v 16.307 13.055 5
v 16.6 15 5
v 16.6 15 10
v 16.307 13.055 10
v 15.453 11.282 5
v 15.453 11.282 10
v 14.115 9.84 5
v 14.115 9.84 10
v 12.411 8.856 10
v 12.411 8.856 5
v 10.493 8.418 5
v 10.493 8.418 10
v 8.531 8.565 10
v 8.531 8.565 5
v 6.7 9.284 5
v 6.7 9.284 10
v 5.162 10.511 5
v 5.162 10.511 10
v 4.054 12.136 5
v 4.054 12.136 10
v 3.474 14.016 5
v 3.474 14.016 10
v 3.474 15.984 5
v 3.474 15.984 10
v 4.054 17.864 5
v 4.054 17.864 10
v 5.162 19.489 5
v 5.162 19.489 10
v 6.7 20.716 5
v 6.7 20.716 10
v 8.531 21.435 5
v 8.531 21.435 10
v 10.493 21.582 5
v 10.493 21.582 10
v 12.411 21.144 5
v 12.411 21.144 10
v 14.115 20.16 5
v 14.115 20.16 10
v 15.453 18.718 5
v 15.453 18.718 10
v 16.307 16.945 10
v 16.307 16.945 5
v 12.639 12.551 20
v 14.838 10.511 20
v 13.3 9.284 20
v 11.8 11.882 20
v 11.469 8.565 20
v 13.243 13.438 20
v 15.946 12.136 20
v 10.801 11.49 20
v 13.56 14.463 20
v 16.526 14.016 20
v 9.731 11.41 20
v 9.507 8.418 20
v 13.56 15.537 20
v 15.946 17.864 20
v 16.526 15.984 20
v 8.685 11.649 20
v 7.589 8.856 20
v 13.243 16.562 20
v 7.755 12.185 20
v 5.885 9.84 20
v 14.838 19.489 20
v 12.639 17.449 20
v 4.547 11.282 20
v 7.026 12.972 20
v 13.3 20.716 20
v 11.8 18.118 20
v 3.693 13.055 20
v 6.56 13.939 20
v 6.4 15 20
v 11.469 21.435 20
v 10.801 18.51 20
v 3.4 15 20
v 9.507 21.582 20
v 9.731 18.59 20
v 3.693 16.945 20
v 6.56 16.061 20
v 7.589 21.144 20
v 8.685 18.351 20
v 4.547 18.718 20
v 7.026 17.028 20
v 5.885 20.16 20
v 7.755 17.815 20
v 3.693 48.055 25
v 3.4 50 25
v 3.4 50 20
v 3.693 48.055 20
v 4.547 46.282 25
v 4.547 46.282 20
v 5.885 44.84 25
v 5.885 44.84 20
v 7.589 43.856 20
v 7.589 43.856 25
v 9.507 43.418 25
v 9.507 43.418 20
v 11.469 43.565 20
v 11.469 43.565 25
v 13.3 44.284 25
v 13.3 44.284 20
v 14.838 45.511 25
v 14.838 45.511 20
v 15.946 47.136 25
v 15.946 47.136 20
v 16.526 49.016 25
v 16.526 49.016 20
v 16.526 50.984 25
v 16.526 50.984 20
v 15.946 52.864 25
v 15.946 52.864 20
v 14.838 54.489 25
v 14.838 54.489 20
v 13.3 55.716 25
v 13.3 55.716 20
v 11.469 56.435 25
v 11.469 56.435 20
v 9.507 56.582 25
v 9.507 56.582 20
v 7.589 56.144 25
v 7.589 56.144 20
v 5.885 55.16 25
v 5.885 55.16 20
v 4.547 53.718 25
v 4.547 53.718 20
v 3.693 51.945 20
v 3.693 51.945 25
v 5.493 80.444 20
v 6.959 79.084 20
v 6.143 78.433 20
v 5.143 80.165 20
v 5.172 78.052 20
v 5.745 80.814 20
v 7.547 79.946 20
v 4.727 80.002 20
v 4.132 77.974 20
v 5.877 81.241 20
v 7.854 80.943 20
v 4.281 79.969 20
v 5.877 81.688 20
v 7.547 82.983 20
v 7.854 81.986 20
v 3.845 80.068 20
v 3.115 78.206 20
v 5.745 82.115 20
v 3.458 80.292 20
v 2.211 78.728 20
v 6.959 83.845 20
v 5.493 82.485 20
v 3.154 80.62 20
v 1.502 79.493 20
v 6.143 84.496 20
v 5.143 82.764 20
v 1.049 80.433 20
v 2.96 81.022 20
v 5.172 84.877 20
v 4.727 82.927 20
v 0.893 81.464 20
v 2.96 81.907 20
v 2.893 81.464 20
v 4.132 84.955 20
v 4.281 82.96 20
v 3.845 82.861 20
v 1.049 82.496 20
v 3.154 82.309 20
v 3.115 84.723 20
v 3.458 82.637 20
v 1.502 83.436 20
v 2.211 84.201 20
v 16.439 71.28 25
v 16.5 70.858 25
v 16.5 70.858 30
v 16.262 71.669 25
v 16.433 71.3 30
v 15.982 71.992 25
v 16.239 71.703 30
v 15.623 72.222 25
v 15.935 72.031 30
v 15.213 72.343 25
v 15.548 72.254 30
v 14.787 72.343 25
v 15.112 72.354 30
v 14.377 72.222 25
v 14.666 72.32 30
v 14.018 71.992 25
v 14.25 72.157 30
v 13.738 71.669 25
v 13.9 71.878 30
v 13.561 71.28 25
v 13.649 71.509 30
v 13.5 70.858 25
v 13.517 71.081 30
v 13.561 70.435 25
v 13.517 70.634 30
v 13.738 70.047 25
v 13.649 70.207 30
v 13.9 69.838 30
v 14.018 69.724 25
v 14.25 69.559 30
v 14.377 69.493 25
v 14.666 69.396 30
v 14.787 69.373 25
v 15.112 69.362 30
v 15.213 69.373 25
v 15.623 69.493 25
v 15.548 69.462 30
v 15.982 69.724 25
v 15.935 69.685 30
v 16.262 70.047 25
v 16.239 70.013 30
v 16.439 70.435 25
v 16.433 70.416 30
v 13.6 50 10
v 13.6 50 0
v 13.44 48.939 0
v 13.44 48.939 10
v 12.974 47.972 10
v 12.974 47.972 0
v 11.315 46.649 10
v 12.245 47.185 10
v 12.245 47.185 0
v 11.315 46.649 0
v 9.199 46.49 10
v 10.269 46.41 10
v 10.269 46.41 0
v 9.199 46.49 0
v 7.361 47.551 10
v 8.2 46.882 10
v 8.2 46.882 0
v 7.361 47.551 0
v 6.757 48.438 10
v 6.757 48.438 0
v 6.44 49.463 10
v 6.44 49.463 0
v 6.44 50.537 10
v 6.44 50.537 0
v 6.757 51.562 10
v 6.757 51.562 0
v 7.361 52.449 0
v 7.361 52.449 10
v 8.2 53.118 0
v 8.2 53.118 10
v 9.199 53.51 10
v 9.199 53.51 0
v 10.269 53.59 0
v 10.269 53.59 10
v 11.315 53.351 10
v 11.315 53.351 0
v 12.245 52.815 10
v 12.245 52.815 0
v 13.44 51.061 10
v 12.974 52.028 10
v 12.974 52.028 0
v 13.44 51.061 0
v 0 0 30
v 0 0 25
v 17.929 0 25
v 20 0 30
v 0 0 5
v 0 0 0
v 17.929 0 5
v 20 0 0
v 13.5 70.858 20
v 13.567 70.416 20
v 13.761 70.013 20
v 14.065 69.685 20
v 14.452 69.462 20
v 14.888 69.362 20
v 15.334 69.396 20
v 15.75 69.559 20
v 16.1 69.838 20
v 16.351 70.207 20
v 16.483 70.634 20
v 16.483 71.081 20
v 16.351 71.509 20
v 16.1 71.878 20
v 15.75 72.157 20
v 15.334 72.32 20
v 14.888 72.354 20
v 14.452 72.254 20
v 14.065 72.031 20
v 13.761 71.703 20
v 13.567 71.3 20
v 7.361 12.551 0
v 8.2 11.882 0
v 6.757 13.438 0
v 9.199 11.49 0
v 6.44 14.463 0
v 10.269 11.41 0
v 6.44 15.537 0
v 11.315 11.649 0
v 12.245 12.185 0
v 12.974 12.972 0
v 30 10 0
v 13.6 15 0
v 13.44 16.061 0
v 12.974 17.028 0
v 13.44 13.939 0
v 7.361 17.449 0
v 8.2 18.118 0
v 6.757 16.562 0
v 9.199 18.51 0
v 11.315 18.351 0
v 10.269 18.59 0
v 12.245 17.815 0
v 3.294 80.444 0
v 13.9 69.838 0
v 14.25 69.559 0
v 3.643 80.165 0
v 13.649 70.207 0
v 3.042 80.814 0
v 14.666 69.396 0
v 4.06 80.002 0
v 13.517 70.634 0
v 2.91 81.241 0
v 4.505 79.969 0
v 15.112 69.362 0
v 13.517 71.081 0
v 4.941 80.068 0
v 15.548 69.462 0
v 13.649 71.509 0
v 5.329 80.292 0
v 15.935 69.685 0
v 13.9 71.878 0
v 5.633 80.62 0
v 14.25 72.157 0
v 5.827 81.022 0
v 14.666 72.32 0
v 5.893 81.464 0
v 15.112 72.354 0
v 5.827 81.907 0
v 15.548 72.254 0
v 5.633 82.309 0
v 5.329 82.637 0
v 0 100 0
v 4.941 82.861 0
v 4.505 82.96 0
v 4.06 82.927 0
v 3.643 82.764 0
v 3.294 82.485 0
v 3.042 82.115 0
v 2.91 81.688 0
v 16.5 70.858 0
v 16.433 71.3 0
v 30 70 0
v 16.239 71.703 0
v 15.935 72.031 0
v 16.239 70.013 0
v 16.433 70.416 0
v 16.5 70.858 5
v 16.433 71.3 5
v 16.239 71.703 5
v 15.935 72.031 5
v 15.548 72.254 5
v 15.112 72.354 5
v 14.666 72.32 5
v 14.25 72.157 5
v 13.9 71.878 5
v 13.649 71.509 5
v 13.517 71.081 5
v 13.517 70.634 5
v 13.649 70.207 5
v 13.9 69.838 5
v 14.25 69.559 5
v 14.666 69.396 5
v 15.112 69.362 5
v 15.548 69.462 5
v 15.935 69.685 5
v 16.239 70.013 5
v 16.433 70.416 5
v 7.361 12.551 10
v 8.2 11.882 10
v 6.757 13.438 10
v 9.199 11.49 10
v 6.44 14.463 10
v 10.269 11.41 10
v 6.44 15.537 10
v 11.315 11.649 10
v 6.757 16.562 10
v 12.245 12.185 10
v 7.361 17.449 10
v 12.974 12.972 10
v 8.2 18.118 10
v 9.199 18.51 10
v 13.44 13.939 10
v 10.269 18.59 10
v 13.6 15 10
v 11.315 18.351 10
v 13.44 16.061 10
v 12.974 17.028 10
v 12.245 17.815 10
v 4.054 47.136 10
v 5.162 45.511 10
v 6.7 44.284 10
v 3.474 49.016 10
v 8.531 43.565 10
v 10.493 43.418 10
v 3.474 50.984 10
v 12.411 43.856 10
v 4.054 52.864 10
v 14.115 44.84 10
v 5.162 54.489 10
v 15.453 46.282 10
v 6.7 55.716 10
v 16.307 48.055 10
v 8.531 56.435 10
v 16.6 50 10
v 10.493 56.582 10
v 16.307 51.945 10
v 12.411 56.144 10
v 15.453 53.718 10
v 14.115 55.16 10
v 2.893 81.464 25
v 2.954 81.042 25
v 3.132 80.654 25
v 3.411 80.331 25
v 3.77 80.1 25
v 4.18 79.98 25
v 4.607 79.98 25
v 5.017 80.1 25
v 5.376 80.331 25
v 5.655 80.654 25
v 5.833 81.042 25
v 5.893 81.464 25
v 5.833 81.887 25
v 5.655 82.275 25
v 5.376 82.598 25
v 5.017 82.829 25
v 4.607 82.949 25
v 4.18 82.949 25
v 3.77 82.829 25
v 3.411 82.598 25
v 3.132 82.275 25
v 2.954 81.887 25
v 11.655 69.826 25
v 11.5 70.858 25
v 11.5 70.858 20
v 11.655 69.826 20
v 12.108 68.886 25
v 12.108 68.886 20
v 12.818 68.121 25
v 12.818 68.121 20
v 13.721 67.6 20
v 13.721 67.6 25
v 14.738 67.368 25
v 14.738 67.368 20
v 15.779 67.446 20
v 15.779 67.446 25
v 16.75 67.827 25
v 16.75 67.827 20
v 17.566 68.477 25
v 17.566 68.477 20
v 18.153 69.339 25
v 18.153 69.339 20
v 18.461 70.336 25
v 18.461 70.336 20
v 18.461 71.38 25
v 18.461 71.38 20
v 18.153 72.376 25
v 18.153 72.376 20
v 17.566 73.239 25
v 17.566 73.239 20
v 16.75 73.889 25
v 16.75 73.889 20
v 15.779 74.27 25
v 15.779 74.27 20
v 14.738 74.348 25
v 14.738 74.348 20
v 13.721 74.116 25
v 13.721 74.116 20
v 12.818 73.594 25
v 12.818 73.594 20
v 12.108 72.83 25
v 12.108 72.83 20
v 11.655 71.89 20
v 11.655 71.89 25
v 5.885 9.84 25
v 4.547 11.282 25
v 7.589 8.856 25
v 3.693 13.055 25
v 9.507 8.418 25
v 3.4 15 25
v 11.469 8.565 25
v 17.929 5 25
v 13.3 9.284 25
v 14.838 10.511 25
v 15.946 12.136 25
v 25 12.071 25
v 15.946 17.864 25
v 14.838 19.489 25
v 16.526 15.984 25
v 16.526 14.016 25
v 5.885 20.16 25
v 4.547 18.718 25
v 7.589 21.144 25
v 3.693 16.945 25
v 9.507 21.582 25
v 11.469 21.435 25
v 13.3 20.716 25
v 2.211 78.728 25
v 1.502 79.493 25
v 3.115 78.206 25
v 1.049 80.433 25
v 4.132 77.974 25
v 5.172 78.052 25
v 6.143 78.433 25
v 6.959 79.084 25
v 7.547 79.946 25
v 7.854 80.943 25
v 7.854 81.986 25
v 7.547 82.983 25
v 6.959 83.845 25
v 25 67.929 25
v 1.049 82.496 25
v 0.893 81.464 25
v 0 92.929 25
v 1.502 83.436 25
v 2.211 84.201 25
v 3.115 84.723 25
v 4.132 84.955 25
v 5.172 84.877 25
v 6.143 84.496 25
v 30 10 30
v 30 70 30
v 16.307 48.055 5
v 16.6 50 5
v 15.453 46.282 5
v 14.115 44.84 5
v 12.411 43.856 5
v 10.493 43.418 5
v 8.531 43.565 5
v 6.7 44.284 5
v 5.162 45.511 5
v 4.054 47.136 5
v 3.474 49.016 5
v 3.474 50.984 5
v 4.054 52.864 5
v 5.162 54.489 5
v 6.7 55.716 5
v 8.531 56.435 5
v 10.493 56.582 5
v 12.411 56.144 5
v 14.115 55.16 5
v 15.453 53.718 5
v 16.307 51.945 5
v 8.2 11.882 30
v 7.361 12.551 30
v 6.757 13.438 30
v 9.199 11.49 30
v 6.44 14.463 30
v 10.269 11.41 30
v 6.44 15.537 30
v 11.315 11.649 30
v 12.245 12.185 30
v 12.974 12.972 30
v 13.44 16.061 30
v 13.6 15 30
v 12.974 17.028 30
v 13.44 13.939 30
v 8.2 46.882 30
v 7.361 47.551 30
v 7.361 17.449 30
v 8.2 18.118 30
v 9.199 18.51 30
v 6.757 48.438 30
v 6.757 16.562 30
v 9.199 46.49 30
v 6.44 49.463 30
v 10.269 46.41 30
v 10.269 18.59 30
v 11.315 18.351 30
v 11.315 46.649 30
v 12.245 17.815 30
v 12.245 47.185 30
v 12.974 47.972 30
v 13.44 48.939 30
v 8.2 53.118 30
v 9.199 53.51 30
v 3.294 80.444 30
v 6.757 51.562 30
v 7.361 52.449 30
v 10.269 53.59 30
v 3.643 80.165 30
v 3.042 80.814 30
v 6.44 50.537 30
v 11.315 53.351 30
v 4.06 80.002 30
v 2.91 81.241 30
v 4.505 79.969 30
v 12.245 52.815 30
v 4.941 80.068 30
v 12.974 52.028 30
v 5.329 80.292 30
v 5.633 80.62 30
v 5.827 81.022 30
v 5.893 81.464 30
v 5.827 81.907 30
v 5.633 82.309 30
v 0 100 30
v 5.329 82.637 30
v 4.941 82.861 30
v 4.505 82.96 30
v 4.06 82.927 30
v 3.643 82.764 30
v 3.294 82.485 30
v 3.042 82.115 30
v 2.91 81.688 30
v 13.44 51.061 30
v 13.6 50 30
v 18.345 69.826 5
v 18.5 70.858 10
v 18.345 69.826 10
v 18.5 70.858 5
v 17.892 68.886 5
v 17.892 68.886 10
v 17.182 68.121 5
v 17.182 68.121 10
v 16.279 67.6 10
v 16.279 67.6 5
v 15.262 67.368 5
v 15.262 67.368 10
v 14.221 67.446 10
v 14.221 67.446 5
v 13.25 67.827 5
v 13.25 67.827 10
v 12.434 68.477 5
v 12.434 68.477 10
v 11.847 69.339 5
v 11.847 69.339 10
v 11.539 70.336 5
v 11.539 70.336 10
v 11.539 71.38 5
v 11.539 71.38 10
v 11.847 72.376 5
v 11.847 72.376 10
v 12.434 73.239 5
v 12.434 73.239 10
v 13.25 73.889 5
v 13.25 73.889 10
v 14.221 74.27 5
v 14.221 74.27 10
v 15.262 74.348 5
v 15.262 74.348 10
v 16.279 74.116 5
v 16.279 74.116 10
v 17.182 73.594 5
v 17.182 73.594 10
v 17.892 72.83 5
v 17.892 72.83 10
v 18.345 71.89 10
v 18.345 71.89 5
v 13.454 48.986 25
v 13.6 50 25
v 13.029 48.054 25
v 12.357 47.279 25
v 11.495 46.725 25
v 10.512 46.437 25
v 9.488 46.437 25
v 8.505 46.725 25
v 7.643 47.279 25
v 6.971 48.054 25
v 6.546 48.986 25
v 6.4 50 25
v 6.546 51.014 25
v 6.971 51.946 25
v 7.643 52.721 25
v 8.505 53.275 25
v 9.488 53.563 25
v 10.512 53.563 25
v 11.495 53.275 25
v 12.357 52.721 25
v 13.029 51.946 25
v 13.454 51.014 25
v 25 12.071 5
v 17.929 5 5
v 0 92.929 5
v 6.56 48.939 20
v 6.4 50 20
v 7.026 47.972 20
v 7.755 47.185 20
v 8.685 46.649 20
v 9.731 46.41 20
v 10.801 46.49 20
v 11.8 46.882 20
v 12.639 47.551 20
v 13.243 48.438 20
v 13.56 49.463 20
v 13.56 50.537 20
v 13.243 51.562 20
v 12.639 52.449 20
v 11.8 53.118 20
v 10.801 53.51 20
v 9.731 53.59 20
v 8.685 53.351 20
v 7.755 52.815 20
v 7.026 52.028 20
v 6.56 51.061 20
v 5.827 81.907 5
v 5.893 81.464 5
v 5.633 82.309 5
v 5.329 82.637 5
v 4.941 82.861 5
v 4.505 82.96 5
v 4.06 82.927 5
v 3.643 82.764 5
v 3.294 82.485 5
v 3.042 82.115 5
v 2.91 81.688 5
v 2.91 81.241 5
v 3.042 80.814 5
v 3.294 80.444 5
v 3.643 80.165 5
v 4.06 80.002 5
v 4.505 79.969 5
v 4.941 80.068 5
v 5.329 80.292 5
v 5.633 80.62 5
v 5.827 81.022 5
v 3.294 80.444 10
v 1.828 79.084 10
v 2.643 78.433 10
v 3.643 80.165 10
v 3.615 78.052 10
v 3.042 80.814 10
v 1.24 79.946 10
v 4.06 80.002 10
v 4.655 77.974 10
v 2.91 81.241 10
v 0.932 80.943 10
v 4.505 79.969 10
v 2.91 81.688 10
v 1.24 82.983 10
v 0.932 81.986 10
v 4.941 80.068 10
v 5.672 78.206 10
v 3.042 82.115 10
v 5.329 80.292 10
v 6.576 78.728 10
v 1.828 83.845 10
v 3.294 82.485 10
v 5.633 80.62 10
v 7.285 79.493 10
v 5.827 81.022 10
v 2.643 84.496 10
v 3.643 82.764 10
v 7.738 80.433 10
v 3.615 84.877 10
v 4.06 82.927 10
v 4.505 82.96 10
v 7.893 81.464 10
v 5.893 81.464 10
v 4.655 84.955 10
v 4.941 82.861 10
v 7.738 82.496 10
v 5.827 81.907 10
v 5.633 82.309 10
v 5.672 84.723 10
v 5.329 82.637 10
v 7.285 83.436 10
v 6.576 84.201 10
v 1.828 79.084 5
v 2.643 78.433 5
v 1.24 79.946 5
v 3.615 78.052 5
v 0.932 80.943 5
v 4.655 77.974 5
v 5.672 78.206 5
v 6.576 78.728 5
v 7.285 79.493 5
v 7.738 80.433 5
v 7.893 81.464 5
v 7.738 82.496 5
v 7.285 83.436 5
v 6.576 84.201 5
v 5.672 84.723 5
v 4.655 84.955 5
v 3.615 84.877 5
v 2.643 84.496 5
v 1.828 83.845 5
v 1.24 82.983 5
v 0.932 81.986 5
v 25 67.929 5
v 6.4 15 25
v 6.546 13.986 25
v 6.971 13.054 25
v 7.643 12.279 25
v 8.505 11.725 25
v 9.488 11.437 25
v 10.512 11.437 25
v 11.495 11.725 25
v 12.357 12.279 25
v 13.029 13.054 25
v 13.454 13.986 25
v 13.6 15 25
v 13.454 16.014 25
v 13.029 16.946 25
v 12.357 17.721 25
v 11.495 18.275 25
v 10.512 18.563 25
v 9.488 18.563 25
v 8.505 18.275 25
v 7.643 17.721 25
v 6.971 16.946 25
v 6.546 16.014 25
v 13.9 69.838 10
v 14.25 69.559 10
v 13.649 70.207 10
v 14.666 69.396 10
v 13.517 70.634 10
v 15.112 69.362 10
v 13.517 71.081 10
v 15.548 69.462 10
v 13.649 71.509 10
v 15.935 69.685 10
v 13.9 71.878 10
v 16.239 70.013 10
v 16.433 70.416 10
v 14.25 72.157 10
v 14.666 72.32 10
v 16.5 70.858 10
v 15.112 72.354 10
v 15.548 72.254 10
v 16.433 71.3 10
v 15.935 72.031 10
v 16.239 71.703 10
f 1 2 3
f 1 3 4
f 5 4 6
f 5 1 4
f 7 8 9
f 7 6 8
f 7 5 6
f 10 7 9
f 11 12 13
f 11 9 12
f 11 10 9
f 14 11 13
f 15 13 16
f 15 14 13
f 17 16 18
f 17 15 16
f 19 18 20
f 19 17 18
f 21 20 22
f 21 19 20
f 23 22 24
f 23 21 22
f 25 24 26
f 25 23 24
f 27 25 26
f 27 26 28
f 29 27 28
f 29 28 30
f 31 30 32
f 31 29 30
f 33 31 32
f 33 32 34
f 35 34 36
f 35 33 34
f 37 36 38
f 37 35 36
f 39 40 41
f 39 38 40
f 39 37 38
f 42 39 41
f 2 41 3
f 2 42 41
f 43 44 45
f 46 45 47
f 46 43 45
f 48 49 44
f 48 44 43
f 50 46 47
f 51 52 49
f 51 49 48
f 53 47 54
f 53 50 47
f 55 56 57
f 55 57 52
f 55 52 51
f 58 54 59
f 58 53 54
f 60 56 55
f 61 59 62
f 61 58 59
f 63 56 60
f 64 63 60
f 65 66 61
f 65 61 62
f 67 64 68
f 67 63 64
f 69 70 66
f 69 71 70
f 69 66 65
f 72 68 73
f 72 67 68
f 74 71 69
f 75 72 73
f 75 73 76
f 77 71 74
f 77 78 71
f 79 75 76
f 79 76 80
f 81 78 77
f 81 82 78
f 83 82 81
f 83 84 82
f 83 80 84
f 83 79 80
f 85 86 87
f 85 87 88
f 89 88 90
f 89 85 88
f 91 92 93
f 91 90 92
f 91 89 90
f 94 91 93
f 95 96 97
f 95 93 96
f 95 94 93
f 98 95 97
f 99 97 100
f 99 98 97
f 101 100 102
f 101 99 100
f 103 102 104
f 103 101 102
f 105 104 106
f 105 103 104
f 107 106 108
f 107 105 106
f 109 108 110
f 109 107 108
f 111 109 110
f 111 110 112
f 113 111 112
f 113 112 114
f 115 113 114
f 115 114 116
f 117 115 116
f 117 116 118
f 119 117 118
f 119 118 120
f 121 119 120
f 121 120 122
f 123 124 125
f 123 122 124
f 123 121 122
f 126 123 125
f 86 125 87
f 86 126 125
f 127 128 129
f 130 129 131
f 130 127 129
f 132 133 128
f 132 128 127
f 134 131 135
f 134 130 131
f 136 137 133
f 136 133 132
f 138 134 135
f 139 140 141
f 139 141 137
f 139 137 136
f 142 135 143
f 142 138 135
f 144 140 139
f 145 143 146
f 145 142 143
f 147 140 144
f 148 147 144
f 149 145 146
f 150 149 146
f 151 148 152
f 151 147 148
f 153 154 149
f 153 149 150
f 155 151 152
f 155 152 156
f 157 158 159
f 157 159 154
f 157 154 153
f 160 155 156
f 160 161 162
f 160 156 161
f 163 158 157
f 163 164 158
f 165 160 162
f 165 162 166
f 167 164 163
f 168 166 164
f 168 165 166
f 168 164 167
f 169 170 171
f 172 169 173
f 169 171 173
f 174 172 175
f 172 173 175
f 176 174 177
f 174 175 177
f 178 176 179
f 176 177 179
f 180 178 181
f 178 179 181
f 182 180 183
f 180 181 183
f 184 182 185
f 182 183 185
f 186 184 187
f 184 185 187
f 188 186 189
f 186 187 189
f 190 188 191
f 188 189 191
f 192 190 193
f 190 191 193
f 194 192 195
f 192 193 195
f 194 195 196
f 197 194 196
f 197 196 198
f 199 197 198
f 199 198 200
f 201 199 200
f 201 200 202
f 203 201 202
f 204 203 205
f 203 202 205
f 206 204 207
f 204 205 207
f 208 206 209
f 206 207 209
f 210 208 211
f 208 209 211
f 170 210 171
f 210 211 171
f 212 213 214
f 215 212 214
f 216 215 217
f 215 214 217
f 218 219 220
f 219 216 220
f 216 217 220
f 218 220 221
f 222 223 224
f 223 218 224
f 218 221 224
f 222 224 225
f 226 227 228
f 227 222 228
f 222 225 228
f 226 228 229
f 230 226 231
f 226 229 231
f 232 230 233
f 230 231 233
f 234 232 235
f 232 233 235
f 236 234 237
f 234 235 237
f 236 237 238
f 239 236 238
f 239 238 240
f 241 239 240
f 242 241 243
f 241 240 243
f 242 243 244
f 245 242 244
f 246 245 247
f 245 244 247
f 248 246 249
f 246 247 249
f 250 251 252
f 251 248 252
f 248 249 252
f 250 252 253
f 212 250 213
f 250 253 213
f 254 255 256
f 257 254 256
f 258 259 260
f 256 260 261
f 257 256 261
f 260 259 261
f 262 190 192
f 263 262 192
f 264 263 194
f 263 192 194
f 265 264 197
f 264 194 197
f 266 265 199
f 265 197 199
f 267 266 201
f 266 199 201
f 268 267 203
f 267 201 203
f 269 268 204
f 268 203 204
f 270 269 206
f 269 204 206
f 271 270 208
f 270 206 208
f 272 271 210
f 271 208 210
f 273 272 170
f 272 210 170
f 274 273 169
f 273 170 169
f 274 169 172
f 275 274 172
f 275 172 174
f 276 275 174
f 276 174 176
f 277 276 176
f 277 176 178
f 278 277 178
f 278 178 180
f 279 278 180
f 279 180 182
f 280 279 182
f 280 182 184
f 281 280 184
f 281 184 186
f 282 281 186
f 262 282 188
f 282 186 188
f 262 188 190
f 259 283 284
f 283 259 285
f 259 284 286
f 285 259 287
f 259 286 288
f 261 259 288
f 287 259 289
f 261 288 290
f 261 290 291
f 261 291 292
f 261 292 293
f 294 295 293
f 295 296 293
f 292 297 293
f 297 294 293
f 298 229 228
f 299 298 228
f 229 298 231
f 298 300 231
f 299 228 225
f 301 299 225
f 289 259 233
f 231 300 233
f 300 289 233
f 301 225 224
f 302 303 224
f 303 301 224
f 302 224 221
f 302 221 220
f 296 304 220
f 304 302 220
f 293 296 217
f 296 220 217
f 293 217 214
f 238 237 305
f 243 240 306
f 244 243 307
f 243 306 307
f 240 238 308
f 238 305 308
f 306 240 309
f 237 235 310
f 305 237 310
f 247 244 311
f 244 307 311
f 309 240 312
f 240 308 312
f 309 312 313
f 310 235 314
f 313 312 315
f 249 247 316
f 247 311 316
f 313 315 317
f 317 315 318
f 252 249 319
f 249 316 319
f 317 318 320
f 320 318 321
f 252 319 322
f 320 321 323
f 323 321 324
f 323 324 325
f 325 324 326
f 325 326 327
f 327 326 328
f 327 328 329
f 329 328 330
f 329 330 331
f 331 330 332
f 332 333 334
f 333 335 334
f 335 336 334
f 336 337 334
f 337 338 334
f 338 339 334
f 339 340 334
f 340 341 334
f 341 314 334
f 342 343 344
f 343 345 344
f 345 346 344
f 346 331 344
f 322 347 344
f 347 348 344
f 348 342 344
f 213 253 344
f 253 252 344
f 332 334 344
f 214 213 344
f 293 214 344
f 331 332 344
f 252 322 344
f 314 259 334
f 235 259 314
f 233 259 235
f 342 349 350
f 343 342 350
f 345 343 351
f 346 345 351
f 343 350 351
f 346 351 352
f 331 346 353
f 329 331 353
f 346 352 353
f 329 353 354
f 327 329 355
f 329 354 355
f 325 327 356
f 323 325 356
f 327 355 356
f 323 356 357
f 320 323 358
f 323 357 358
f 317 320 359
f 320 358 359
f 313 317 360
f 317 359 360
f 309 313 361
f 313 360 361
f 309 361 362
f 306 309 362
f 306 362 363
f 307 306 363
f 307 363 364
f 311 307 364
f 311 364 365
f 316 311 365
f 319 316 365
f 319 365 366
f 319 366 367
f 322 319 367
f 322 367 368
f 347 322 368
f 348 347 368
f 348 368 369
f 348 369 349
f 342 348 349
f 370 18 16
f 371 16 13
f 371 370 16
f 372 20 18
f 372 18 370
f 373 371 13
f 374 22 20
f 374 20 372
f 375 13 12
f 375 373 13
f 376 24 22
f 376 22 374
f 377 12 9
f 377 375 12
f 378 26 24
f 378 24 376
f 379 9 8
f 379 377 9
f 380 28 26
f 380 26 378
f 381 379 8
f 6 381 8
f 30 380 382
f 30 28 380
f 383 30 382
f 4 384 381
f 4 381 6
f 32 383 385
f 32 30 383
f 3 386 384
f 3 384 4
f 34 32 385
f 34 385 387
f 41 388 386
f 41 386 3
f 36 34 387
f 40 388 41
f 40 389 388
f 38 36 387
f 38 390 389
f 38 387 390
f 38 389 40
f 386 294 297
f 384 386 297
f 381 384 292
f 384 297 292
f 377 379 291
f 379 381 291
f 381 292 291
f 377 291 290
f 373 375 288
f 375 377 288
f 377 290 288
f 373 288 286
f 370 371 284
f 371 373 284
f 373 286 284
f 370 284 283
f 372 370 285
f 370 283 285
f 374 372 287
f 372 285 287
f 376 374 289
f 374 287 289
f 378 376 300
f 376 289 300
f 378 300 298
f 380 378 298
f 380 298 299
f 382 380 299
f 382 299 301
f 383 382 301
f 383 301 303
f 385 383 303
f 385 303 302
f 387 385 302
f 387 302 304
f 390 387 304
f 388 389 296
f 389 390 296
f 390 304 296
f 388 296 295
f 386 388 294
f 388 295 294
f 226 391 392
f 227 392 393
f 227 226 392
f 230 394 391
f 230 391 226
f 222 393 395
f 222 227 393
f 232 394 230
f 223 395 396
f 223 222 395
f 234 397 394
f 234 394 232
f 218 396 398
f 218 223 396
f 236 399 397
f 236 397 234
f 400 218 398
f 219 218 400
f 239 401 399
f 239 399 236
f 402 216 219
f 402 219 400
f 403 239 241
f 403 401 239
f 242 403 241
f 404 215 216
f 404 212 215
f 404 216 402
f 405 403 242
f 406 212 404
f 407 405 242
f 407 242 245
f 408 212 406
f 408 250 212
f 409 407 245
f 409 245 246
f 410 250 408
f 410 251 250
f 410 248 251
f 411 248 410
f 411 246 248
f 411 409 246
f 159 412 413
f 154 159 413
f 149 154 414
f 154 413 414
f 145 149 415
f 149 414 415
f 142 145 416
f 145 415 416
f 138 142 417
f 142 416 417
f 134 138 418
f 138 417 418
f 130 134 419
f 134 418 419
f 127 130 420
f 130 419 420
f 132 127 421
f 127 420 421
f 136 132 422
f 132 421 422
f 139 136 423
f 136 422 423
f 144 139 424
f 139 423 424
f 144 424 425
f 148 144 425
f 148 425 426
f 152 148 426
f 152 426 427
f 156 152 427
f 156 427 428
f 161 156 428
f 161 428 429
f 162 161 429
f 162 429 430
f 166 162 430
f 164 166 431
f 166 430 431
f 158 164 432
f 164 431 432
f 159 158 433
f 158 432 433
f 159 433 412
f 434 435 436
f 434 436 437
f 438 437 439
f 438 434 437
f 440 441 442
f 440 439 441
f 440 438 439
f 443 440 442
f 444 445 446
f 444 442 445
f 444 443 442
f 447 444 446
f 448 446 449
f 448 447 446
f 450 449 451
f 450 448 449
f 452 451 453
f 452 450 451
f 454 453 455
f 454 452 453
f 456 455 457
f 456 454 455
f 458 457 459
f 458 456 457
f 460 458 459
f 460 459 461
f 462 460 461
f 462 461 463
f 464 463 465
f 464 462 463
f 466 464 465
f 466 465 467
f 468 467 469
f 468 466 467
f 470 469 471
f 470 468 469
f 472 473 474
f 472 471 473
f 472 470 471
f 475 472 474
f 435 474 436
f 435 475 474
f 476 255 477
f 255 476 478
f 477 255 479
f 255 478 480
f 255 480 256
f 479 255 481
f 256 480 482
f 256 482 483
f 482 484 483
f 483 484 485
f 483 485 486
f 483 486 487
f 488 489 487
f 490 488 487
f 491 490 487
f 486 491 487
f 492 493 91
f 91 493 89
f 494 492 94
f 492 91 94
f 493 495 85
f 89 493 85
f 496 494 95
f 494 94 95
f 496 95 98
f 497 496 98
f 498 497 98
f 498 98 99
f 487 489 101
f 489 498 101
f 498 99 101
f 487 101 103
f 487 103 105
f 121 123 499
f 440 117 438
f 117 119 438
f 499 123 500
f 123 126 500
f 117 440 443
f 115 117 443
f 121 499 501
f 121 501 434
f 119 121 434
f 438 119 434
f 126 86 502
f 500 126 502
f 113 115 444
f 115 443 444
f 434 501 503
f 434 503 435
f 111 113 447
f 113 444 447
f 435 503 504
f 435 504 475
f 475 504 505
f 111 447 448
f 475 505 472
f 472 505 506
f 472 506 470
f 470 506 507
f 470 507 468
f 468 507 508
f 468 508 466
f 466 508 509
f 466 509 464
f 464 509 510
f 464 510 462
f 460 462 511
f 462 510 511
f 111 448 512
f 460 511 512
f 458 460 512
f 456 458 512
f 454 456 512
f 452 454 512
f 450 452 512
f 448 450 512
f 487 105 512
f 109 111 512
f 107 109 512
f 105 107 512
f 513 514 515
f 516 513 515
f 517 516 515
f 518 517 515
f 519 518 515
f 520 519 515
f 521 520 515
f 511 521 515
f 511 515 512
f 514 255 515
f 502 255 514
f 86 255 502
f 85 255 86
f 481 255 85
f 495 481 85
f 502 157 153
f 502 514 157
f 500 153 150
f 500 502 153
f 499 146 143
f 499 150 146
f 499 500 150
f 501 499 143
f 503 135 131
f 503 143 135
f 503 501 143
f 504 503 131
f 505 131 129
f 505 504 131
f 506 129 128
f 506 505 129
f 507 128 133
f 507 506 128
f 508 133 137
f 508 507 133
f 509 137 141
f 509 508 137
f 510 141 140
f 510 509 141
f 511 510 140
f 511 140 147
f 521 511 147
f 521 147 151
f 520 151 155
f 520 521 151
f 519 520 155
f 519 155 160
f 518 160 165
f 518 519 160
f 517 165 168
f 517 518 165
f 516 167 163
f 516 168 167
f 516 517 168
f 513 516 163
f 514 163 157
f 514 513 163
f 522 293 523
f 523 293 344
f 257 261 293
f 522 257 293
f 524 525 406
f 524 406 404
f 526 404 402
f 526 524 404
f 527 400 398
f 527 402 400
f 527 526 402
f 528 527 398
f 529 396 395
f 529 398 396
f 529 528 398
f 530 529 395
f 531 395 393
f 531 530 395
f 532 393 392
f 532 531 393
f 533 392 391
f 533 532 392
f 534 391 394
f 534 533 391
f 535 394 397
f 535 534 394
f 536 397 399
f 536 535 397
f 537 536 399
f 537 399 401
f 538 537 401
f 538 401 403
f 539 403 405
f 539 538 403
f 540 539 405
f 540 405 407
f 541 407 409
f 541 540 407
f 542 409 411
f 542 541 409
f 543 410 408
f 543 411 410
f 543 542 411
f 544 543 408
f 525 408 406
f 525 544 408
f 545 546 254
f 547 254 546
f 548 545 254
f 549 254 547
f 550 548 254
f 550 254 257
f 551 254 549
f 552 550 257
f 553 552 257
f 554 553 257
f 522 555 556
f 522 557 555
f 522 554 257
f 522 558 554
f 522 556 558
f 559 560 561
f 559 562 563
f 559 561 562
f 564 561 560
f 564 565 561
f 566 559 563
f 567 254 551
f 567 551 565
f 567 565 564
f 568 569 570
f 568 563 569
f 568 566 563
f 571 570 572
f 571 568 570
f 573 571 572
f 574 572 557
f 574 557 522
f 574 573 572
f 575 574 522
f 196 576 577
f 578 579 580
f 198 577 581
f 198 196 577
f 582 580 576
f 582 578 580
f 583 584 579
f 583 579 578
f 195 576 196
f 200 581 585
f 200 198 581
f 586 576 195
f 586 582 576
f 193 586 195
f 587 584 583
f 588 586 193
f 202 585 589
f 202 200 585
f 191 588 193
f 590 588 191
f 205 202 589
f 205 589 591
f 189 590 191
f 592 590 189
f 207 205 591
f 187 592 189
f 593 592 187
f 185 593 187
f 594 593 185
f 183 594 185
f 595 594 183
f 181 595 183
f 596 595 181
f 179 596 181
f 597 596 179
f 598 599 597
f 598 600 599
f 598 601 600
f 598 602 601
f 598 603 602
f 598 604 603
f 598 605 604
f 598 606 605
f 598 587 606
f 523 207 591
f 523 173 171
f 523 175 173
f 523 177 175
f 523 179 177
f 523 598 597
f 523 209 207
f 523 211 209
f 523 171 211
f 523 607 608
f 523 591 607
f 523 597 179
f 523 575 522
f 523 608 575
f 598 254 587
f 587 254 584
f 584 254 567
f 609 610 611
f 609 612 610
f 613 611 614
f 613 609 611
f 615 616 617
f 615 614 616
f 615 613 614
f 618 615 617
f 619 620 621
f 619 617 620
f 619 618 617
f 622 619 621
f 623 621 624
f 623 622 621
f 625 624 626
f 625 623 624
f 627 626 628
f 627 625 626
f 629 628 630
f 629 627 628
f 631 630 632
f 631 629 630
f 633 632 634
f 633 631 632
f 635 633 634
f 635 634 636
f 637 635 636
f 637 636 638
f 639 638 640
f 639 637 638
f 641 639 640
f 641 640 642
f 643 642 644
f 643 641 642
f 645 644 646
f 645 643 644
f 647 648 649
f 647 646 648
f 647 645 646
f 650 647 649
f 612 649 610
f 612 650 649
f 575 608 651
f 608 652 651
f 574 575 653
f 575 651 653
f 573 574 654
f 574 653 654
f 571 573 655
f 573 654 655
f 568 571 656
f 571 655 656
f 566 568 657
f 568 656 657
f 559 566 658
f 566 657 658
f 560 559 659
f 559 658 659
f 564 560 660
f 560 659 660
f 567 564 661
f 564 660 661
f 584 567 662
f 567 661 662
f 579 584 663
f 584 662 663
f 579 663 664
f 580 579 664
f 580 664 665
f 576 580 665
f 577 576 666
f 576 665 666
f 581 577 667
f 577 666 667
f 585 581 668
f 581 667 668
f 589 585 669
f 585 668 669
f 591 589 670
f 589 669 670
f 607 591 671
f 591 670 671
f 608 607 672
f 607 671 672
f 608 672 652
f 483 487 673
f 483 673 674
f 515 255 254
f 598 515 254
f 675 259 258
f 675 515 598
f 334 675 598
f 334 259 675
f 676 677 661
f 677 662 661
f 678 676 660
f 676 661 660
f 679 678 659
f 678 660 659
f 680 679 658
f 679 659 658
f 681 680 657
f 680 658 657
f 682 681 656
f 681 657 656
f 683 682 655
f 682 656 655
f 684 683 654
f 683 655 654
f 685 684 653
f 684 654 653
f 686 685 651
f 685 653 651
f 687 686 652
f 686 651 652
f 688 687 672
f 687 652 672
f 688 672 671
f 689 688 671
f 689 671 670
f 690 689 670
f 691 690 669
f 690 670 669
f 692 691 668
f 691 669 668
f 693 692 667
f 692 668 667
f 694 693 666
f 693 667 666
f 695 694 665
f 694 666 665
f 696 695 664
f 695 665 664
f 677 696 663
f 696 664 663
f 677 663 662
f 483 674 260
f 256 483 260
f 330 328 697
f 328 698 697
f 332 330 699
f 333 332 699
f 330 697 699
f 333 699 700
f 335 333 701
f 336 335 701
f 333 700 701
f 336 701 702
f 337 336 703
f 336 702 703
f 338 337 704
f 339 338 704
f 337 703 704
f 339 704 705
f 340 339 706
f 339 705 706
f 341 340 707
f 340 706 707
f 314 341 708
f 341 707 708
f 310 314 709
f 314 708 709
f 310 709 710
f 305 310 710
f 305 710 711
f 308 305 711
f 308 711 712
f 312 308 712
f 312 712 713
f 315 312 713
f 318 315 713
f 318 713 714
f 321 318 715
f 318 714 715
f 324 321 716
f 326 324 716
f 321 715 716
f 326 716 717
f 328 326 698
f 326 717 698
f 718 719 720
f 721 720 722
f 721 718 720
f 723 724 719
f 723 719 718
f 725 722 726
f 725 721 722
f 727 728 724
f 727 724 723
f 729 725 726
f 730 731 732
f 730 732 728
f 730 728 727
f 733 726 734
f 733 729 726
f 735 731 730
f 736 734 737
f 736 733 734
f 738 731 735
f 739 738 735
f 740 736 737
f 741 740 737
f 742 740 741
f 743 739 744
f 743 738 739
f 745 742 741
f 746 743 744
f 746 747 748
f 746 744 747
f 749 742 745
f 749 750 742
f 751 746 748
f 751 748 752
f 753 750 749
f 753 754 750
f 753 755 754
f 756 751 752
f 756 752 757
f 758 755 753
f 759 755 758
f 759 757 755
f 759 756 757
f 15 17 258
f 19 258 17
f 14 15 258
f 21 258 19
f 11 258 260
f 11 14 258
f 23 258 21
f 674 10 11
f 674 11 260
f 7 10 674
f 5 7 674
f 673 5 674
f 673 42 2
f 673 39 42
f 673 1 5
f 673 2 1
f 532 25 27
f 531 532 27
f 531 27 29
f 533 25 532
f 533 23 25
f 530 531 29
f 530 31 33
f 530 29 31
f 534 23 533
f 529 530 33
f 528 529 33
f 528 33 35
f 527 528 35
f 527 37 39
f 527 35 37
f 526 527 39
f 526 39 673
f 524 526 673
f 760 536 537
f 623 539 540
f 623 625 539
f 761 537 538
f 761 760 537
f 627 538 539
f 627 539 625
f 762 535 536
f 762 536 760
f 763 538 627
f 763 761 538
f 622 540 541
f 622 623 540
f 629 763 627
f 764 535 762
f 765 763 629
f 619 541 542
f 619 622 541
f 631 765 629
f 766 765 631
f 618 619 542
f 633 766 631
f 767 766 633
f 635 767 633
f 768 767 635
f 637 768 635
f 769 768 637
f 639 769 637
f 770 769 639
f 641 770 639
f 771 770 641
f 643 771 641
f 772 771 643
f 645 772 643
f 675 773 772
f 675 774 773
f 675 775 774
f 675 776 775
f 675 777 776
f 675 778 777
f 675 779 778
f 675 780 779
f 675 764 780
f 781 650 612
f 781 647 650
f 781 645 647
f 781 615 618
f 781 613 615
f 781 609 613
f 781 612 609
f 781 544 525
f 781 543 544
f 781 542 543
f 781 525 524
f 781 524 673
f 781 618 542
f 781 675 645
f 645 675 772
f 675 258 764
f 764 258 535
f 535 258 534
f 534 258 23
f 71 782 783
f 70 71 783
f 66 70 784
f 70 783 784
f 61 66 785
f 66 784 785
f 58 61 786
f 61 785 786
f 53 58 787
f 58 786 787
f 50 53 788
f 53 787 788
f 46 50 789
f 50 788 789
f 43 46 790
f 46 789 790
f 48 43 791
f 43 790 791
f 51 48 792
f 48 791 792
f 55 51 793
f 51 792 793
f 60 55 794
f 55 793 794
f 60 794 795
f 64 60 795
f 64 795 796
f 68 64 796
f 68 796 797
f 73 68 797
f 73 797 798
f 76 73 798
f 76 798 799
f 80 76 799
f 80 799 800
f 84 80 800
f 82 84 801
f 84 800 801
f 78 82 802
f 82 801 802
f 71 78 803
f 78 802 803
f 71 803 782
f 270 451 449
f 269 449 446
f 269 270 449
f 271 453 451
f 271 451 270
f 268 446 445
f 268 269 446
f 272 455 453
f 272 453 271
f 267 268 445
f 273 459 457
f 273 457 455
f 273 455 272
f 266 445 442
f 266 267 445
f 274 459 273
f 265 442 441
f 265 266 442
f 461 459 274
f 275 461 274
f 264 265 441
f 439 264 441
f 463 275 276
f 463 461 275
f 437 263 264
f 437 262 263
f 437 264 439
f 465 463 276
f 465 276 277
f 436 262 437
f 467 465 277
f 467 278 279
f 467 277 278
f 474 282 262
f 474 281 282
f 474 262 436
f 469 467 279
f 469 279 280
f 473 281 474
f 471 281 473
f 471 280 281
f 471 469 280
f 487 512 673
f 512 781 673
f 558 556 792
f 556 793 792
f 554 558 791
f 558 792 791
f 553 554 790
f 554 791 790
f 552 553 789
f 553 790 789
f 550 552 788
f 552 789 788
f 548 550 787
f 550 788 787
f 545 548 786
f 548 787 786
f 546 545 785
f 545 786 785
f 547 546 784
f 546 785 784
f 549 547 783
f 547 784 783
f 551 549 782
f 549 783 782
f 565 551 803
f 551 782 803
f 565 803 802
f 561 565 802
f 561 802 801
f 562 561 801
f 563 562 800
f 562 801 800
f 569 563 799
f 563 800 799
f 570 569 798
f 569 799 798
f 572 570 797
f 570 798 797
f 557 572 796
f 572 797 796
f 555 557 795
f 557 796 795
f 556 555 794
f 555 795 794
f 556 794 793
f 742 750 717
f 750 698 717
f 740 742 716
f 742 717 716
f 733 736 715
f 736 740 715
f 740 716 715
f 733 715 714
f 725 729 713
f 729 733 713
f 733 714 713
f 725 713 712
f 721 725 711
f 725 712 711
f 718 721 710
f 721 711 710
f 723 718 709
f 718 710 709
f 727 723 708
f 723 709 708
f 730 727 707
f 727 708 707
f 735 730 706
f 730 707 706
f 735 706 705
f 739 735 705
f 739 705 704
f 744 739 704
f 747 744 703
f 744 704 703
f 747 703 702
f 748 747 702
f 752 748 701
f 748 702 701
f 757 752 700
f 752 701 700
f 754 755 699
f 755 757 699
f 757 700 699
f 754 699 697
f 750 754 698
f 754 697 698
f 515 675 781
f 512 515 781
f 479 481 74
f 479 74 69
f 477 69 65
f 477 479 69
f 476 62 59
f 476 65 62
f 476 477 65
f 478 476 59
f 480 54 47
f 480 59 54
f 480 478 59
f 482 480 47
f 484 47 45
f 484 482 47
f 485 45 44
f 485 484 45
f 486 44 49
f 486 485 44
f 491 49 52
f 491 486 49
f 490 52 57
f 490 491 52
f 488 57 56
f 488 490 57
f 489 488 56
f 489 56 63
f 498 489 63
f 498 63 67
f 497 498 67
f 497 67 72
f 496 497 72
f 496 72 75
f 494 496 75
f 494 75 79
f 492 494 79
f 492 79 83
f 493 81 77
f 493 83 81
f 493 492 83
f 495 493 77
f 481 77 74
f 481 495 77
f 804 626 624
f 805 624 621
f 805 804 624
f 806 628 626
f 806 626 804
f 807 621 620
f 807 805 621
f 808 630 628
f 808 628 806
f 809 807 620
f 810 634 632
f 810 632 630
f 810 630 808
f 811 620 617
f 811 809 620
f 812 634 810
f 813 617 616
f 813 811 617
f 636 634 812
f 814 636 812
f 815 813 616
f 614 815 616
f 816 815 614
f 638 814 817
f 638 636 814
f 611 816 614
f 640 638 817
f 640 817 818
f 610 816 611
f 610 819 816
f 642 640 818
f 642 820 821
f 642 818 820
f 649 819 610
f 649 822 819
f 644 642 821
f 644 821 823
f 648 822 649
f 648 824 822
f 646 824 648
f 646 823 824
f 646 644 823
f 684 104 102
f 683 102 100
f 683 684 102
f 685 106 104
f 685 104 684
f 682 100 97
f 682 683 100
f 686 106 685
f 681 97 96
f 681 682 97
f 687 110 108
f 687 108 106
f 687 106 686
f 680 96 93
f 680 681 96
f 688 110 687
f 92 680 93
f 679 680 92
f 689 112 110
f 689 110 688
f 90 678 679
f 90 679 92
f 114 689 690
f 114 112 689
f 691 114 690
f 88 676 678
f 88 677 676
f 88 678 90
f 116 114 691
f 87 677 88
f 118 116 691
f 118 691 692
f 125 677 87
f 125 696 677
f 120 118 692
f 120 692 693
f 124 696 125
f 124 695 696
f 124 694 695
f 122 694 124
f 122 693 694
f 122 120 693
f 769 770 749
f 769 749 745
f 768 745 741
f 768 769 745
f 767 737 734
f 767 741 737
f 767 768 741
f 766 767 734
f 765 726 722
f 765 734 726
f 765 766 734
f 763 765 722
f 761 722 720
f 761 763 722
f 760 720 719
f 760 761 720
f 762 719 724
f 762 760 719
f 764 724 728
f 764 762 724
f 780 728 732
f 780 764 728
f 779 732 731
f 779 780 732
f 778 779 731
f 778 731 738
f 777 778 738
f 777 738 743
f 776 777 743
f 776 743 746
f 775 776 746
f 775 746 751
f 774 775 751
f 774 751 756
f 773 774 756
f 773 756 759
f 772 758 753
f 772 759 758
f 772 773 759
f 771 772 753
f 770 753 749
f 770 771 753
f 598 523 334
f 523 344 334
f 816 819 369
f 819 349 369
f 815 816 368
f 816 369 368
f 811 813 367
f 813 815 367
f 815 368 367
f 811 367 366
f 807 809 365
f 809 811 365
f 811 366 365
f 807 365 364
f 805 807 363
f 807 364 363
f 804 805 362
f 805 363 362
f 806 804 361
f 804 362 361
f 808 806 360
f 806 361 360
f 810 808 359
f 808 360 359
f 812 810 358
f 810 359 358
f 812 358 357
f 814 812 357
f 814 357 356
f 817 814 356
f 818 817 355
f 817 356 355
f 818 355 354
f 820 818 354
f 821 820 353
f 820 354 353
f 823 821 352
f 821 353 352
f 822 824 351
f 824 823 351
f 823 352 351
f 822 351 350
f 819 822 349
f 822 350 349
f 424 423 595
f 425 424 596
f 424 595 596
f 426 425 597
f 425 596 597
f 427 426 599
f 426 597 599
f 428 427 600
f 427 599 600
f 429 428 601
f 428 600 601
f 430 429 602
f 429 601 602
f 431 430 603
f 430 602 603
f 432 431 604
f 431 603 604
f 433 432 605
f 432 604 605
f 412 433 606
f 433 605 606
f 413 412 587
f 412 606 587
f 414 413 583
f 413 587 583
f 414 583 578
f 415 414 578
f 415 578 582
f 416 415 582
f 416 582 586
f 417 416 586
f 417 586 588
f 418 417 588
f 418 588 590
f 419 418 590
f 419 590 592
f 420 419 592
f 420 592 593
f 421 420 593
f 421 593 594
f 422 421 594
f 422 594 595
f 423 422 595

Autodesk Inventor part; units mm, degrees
ref_plane "YZ Plane" through (0, 0, 0) normal (1, 0, 0) x (0, 1, 0)
ref_plane "XZ Plane" through (0, 0, 0) normal (0, 1, 0) x (-1, 0, 0)
sketch "Sketch3" plane through (0, 0, 0) normal (0, 0, 1) x (1, 0, 0)
  line L0 (0, 0) -> (0, 100)
  line L1 (0, 0) -> (20, 0)
  line L2 (20, 0) -> (30, 10)
  line L3 (30, 10) -> (30, 70)
  line L4 (30, 70) -> (0, 100)
  circle A0 centre (10, 15) radius 3.6
  circle A1 centre (10, 50) radius 3.6
  point P0 (10, 0)
  dimension "d6" = 100
  dimension "d7" = 20
  dimension "d13" = 10
  dimension "d14" = 10
  dimension "d15" = 7.2
  dimension "d16" = 7.2
  dimension "d17" = 35
  dimension "d18" = 15
  dimension "d33" = 135
extrude "Extrusion1" add sketch "Sketch3" along normal blind 30
ref_plane "Work Plane1" through (0, 0, 15) normal (0, 0, 1) x (1, 0, 0)
sketch "Sketch4" plane through (0, 0, 15) normal (0, 0, 1) x (1, 0, 0)
  line L0 (0, 100) -> (30, 70) projected
  line L1 (30, 70) -> (30, 10) projected
  line L2 (30, 10) -> (20, 0) projected
  line L3 (20, 0) -> (0, 0) projected
  line L4 (0, 92.9289) -> (25, 67.9289)
  line L5 (25, 67.9289) -> (25, 12.0711)
  line L6 (25, 12.0711) -> (17.9289, 5)
  line L7 (0, 0) -> (0, 100) projected
  line L8 (0, 5) -> (0, 92.9289)
  line L9 (17.9289, 5) -> (17.9289, 0)
  line L10 (17.9289, 0) -> (0, 0)
  line L11 (0, 5) -> (0, 0)
  dimension "d21" = 5
extrude "Extrusion2" cut sketch "Sketch4" along normal mid plane 20 contours L4 L5 L6 L9 L3 L7
sketch "Sketch5" plane through (0, 0, 30) normal (0, 0, 1) x (1, 0, 0)
  circle A0 centre (4.3934, 81.4645) radius 1.5
  circle A1 centre (15, 70.8579) radius 1.5
  line L0 (30, 70) -> (0, 100) construction
  line L1 (4.3934, 81.4645) -> (5.8076, 80.0503) construction
  line L2 (5.8076, 80.0503) -> (12.8787, 87.1213) construction
  line L3 (5.8076, 80.0503) -> (15, 70.8579) construction
  point P0 (0, 0)
  point P1 (15, 85)
  dimension "d24" = 3
  dimension "d25" = 3
  dimension "d35" = 2
  dimension "d37" = 13
  dimension "d38" = 10
extrude "Extrusion3" cut sketch "Sketch5" against normal through all
sketch "Sketch7" plane through (0, 0, 5) normal (0, 0, 1) x (1, 0, 0)
  circle A0 centre (10, 50) radius 3.6 projected
  circle A1 centre (10, 15) radius 3.6 projected
  circle A2 centre (10, 50) radius 6.6
  circle A3 centre (10, 15) radius 6.6
  point P0 (0, 0)
  dimension "d45" = 3
  dimension "d46" = 3
extrude "Extrusion5" add sketch "Sketch7" along normal blind 5
sketch "Sketch8" plane through (0, 0, 25) normal (0, 0, -1) x (-1, 0, 0)
  circle A0 centre (-10, 50) radius 3.6 projected
  circle A1 centre (-10, 15) radius 3.6 projected
  circle A2 centre (-10, 50) radius 6.6
  circle A3 centre (-10, 15) radius 6.6
  point P0 (0, 0)
  dimension "d49" = 3
  dimension "d50" = 3
extrude "Extrusion6" add sketch "Sketch8" along normal blind 5
sketch "Sketch9" plane through (0, 0, 5) normal (0, 0, 1) x (1, 0, 0)
  circle A0 centre (4.3934, 81.4645) radius 1.5 projected
  circle A1 centre (15, 70.8579) radius 1.5 projected
  circle A2 centre (4.3934, 81.4645) radius 3.5
  circle A3 centre (15, 70.8579) radius 3.5
  point P0 (0, 0)
  dimension "d53" = 2
  dimension "d54" = 2
extrude "Extrusion7" add sketch "Sketch9" along normal blind 5
sketch "Sketch10" plane through (0, 0, 25) normal (0, 0, -1) x (-1, 0, 0)
  circle A0 centre (-4.3934, 81.4645) radius 1.5 projected
  circle A1 centre (-15, 70.8579) radius 1.5 projected
  circle A2 centre (-4.3934, 81.4645) radius 3.5
  circle A3 centre (-15, 70.8579) radius 3.5
  point P0 (0, 0)
  dimension "d57" = 2
  dimension "d58" = 2
extrude "Extrusion8" add sketch "Sketch10" along normal blind 5
properties part number "GA005" material "ABS Plastic"
